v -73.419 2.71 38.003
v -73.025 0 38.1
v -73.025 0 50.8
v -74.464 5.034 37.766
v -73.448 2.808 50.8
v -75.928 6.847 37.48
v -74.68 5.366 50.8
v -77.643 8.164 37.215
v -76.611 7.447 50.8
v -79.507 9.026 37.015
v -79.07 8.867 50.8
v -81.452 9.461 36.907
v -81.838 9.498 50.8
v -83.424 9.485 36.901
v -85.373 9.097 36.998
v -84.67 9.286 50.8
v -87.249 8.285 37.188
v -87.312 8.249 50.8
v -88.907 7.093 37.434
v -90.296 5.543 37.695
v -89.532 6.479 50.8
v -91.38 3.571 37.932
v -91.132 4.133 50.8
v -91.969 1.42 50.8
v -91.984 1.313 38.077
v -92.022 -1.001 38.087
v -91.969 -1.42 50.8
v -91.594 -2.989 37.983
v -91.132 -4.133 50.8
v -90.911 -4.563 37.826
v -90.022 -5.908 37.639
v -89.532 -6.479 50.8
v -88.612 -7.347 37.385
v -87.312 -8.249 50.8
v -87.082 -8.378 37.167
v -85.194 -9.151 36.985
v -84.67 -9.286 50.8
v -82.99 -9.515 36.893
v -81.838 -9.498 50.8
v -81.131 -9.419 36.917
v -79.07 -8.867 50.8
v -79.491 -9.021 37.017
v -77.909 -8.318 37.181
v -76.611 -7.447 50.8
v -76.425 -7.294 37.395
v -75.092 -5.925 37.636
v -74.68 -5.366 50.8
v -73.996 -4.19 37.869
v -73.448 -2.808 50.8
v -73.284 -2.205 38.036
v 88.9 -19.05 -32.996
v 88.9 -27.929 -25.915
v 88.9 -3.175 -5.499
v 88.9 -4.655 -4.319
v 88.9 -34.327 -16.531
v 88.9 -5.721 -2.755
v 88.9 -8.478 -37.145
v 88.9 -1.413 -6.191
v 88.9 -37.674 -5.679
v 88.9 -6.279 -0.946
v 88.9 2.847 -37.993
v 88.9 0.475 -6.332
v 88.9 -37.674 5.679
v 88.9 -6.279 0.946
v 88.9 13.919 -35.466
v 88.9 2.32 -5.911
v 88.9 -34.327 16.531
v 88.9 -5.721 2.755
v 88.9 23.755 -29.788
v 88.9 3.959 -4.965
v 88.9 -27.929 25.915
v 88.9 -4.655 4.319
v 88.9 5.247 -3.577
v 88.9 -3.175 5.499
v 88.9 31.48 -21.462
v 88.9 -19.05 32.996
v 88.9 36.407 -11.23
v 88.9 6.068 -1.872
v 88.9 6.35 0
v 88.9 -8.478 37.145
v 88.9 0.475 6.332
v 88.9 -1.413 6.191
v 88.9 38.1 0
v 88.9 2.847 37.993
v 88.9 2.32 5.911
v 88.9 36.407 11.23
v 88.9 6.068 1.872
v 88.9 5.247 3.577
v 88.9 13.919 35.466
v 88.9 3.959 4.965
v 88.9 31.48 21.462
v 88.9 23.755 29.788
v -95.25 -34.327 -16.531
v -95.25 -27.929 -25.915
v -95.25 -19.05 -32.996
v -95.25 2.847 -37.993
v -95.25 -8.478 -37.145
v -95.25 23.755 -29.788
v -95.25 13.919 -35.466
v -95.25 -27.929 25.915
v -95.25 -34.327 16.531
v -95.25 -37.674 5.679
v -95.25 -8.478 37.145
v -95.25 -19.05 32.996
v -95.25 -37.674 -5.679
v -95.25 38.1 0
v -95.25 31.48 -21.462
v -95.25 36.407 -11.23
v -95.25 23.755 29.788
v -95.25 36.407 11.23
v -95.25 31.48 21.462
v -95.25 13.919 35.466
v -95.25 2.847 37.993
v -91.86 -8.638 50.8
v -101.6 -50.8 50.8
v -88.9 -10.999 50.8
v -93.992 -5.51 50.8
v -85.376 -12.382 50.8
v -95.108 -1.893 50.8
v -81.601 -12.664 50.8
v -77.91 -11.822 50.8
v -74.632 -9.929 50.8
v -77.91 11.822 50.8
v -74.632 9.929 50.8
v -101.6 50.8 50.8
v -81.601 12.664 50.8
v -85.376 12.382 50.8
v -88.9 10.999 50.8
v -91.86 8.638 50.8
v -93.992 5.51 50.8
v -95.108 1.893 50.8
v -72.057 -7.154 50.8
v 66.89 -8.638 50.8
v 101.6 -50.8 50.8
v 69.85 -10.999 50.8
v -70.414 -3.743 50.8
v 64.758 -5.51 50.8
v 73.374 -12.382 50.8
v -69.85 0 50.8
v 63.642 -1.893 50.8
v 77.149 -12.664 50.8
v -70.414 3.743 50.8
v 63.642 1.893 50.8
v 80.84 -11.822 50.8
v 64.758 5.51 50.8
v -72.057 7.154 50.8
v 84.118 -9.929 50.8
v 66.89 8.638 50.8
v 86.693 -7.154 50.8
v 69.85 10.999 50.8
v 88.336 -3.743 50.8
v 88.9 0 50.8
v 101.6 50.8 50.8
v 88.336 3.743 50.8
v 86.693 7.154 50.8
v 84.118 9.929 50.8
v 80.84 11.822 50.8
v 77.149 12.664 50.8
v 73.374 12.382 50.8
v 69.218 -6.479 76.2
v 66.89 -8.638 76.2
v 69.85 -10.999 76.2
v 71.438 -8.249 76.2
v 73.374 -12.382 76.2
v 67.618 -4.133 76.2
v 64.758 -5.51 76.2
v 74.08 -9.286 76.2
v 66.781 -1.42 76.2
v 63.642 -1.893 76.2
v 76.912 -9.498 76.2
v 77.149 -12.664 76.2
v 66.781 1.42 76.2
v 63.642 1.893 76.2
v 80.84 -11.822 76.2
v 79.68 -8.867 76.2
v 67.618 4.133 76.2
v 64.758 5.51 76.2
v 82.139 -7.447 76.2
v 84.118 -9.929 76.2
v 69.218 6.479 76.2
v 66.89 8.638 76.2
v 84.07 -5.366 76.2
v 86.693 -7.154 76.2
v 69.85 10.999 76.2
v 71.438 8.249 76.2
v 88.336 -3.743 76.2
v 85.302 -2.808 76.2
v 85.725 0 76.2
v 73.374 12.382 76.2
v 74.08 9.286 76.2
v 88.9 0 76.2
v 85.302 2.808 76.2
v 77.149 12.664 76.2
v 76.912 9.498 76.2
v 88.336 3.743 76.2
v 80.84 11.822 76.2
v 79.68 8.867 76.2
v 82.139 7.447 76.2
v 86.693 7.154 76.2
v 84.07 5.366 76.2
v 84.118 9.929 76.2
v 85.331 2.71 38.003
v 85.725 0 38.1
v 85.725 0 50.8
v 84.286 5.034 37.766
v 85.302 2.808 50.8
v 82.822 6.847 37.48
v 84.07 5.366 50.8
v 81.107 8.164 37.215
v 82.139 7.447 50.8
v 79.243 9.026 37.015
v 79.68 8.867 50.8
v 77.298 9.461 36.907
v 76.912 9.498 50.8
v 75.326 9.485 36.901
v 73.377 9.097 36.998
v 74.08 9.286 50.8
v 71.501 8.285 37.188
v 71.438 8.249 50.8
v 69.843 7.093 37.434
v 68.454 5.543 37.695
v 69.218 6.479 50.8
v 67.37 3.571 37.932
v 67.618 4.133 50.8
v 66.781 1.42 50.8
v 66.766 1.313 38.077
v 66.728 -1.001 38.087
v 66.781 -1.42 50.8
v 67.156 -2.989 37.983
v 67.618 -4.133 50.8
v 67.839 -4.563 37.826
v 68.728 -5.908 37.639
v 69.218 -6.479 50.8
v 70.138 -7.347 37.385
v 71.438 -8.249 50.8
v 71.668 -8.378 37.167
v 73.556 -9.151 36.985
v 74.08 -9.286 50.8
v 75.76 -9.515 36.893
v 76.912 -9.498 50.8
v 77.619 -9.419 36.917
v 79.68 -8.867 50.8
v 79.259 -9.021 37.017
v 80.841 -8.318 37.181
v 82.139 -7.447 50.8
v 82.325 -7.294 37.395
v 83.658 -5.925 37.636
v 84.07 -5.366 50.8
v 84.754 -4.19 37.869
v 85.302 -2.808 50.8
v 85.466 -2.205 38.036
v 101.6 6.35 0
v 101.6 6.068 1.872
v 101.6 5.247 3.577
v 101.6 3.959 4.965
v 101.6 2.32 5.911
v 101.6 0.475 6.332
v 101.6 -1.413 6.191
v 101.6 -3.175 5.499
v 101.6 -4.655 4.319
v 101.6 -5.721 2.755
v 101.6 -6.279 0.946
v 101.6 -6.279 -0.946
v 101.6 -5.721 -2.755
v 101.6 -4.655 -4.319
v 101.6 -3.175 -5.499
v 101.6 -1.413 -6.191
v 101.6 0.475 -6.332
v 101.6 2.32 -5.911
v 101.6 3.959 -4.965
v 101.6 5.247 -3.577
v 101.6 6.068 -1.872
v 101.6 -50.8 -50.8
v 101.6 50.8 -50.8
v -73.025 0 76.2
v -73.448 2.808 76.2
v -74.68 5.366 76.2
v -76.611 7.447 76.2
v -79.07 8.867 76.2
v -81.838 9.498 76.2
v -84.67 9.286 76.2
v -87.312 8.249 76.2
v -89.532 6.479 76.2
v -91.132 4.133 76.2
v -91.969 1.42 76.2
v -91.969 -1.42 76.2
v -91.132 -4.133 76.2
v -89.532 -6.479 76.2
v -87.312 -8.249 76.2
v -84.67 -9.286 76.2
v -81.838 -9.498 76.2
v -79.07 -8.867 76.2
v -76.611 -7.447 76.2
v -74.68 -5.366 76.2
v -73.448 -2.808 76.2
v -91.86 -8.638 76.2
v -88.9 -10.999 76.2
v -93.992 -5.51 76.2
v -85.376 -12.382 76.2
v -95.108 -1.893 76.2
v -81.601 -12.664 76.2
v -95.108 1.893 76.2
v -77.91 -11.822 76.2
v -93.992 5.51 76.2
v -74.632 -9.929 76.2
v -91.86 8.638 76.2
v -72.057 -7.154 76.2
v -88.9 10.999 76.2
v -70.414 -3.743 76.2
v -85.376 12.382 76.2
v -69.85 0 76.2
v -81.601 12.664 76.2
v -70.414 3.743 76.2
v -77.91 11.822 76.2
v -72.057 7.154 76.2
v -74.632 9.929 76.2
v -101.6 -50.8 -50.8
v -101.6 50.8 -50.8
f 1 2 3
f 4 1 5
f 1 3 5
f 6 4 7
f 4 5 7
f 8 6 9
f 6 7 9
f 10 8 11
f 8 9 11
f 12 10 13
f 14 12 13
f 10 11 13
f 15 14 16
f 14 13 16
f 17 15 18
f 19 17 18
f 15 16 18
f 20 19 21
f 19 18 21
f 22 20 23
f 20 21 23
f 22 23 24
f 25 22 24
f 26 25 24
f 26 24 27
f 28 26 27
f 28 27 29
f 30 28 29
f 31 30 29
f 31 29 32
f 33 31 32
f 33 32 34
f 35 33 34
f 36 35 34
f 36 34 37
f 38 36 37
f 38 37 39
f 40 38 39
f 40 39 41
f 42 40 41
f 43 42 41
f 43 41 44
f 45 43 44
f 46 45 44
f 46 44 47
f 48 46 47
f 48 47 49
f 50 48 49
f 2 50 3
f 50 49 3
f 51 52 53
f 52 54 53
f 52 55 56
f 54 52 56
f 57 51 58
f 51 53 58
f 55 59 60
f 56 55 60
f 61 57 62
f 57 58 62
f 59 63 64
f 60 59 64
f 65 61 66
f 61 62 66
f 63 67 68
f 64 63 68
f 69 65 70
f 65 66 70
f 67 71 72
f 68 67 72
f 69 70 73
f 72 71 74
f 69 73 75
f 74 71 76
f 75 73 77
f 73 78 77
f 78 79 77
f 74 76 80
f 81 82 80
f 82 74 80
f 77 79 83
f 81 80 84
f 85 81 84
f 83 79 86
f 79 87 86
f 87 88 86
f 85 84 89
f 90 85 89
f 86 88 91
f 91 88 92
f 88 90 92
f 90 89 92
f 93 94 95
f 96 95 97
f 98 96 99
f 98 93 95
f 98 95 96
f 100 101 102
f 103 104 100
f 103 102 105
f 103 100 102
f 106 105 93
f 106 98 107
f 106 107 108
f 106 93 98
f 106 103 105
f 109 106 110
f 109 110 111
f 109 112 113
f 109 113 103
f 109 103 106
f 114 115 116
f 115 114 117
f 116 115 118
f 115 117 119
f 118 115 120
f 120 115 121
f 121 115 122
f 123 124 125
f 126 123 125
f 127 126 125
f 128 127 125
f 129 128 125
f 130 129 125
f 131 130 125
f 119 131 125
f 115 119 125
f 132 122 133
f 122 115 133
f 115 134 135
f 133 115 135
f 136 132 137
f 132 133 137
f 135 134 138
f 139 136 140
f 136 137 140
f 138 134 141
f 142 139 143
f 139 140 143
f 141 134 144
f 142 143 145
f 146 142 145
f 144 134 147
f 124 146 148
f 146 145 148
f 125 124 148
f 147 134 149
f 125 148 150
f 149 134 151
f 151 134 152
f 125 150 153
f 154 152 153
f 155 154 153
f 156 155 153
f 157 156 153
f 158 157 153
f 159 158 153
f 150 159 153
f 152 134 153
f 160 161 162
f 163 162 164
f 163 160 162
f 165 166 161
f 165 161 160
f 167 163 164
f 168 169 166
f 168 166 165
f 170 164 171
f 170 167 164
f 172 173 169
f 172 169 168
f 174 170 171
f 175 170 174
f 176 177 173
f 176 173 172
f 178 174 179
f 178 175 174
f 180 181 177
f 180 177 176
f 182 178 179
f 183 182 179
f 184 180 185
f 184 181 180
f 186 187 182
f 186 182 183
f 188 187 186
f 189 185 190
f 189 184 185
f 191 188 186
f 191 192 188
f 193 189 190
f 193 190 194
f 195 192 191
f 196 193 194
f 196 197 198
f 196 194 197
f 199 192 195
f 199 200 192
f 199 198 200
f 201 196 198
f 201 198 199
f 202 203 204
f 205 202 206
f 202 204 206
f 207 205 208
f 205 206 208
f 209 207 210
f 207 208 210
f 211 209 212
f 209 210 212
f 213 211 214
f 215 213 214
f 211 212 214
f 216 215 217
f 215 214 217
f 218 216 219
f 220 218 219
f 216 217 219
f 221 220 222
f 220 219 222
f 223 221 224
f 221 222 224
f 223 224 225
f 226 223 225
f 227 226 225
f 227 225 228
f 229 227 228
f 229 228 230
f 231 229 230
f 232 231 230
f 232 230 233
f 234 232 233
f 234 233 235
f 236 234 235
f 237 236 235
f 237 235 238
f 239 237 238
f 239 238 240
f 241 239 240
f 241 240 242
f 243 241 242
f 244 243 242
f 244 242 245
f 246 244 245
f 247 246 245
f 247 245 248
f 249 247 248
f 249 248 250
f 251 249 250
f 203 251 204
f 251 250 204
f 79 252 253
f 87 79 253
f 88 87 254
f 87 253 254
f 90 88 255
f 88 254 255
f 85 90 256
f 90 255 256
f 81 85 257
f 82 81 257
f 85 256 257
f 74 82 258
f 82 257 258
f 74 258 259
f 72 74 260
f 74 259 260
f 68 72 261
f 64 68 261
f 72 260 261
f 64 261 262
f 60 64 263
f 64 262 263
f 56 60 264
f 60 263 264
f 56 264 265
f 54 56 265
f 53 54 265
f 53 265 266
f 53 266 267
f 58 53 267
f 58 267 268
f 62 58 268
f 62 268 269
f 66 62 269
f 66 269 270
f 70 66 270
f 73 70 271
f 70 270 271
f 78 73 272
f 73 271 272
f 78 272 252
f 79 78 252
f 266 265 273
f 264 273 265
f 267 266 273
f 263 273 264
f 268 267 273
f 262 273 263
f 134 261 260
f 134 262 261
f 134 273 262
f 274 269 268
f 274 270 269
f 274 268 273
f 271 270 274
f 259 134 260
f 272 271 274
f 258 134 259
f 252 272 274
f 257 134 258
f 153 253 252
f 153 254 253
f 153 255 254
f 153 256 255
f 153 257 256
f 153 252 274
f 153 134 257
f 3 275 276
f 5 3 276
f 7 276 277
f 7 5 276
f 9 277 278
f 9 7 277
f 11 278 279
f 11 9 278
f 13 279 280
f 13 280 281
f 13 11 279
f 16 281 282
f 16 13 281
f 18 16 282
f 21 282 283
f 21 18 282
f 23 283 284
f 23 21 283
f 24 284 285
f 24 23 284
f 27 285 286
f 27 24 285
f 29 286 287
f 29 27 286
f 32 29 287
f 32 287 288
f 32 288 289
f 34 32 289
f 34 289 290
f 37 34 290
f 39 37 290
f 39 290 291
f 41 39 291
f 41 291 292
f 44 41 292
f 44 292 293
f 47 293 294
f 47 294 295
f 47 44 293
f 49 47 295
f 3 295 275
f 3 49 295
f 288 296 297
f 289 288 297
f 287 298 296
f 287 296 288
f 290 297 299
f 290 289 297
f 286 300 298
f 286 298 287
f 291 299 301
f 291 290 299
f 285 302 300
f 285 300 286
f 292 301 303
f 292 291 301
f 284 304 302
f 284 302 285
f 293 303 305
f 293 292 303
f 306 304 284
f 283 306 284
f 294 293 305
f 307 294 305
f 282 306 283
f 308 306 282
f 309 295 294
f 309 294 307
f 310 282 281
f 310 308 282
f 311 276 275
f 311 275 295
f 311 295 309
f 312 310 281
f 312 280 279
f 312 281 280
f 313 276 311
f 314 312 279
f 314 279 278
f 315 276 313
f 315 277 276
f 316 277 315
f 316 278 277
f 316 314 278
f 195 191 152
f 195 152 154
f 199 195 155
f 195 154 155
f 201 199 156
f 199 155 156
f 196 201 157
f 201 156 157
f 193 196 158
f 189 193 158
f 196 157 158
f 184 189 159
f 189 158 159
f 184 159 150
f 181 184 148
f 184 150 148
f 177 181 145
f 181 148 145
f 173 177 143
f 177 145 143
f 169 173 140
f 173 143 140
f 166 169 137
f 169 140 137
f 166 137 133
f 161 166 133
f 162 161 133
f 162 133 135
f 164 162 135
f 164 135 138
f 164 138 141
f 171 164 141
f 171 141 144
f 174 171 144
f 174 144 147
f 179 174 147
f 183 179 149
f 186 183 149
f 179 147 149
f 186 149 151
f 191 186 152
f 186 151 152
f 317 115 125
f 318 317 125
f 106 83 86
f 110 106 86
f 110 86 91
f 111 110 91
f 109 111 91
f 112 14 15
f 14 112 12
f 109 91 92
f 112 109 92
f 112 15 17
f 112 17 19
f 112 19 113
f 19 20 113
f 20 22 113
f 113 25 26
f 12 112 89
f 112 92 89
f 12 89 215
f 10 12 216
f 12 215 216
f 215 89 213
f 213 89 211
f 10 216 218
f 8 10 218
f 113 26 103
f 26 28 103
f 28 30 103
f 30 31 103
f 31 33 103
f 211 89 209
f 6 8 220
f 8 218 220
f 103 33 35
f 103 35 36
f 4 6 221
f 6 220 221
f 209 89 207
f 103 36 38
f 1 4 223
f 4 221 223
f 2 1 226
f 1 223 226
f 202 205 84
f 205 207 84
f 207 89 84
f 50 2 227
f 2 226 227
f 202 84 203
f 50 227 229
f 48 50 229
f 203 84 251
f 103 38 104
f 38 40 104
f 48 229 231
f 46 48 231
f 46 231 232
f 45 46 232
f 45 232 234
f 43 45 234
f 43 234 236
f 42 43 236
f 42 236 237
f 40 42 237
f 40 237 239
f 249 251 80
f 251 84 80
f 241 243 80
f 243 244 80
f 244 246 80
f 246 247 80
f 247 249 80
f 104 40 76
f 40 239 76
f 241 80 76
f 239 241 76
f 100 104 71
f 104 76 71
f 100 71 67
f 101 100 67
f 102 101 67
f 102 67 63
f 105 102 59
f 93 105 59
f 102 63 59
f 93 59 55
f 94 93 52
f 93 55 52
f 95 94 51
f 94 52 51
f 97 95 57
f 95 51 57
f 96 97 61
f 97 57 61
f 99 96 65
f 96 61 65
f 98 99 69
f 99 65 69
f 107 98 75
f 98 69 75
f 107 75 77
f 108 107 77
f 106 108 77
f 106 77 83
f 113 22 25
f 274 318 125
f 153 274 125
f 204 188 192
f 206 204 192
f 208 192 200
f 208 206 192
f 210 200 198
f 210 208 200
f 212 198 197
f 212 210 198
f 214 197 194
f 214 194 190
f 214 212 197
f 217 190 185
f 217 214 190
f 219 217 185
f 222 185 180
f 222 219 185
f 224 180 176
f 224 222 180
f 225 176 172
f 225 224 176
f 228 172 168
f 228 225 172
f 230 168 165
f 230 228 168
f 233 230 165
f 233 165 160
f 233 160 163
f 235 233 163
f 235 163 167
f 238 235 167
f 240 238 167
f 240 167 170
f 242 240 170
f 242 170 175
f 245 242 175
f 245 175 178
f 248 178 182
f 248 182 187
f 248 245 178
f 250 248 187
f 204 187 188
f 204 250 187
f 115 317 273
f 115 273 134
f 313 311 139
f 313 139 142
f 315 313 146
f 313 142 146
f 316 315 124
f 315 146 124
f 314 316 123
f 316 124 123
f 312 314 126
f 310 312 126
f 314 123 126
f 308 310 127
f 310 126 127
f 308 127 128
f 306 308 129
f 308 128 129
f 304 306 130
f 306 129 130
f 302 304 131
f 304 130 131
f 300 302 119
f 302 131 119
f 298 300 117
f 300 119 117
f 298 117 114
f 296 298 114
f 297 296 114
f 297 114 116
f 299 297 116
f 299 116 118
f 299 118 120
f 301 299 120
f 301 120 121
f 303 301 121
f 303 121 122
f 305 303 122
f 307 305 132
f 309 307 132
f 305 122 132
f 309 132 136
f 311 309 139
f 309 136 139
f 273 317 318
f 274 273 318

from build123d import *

# Parameters (mm, degrees)
F0_W      = 101.6
F0_H      = 101.6
F1_DEPTH  = 101.6
F3_R      = 38.1
F4_DEPTH  = 184.15
F5_R      = 6.35
F6_DEPTH  = 12.7
F7_R      = 9.525
F8_DEPTH  = 25.4
F9_R      = 12.7
F9_R_2    = 9.525
F10_DEPTH = 25.4


with BuildPart() as f1:
    # F0 (on Right) → F1 (new body, symmetric)
    with BuildSketch(Plane.YZ):
        Rectangle(F0_W, F0_H)
    extrude(amount=F1_DEPTH, both=True)

    # F3 (on offset) → F4 (cut)
    with BuildSketch(Plane.YZ.offset(88.9)):
        Circle(F3_R)
    extrude(amount=-F4_DEPTH, mode=Mode.SUBTRACT)

    # F5 (on face) → F6 (cut, through all)
    with BuildSketch(Plane.YZ.offset(101.6)):
        Circle(F5_R)
    extrude(amount=-F6_DEPTH, mode=Mode.SUBTRACT)

    # F7 (on face) → F8 (cut)
    with BuildSketch(Plane.XY.offset(50.8)):
        with Locations((-82.55, 0)):
            Circle(F7_R)
        with Locations((76.2, 0)):
            Circle(F7_R)
    extrude(amount=-F8_DEPTH, mode=Mode.SUBTRACT)

    # F9 (on face) → F10 (join)
    with BuildSketch(Plane.XY.offset(50.8)):
        with Locations((-82.55, 0)):
            Circle(F9_R)
        with Locations((-82.55, 0)):
            Circle(F9_R_2, mode=Mode.SUBTRACT)
        with Locations((76.2, 0)):
            Circle(F9_R)
        with Locations((76.2, 0)):
            Circle(F9_R_2, mode=Mode.SUBTRACT)
    extrude(amount=F10_DEPTH)


solid = f1.part
